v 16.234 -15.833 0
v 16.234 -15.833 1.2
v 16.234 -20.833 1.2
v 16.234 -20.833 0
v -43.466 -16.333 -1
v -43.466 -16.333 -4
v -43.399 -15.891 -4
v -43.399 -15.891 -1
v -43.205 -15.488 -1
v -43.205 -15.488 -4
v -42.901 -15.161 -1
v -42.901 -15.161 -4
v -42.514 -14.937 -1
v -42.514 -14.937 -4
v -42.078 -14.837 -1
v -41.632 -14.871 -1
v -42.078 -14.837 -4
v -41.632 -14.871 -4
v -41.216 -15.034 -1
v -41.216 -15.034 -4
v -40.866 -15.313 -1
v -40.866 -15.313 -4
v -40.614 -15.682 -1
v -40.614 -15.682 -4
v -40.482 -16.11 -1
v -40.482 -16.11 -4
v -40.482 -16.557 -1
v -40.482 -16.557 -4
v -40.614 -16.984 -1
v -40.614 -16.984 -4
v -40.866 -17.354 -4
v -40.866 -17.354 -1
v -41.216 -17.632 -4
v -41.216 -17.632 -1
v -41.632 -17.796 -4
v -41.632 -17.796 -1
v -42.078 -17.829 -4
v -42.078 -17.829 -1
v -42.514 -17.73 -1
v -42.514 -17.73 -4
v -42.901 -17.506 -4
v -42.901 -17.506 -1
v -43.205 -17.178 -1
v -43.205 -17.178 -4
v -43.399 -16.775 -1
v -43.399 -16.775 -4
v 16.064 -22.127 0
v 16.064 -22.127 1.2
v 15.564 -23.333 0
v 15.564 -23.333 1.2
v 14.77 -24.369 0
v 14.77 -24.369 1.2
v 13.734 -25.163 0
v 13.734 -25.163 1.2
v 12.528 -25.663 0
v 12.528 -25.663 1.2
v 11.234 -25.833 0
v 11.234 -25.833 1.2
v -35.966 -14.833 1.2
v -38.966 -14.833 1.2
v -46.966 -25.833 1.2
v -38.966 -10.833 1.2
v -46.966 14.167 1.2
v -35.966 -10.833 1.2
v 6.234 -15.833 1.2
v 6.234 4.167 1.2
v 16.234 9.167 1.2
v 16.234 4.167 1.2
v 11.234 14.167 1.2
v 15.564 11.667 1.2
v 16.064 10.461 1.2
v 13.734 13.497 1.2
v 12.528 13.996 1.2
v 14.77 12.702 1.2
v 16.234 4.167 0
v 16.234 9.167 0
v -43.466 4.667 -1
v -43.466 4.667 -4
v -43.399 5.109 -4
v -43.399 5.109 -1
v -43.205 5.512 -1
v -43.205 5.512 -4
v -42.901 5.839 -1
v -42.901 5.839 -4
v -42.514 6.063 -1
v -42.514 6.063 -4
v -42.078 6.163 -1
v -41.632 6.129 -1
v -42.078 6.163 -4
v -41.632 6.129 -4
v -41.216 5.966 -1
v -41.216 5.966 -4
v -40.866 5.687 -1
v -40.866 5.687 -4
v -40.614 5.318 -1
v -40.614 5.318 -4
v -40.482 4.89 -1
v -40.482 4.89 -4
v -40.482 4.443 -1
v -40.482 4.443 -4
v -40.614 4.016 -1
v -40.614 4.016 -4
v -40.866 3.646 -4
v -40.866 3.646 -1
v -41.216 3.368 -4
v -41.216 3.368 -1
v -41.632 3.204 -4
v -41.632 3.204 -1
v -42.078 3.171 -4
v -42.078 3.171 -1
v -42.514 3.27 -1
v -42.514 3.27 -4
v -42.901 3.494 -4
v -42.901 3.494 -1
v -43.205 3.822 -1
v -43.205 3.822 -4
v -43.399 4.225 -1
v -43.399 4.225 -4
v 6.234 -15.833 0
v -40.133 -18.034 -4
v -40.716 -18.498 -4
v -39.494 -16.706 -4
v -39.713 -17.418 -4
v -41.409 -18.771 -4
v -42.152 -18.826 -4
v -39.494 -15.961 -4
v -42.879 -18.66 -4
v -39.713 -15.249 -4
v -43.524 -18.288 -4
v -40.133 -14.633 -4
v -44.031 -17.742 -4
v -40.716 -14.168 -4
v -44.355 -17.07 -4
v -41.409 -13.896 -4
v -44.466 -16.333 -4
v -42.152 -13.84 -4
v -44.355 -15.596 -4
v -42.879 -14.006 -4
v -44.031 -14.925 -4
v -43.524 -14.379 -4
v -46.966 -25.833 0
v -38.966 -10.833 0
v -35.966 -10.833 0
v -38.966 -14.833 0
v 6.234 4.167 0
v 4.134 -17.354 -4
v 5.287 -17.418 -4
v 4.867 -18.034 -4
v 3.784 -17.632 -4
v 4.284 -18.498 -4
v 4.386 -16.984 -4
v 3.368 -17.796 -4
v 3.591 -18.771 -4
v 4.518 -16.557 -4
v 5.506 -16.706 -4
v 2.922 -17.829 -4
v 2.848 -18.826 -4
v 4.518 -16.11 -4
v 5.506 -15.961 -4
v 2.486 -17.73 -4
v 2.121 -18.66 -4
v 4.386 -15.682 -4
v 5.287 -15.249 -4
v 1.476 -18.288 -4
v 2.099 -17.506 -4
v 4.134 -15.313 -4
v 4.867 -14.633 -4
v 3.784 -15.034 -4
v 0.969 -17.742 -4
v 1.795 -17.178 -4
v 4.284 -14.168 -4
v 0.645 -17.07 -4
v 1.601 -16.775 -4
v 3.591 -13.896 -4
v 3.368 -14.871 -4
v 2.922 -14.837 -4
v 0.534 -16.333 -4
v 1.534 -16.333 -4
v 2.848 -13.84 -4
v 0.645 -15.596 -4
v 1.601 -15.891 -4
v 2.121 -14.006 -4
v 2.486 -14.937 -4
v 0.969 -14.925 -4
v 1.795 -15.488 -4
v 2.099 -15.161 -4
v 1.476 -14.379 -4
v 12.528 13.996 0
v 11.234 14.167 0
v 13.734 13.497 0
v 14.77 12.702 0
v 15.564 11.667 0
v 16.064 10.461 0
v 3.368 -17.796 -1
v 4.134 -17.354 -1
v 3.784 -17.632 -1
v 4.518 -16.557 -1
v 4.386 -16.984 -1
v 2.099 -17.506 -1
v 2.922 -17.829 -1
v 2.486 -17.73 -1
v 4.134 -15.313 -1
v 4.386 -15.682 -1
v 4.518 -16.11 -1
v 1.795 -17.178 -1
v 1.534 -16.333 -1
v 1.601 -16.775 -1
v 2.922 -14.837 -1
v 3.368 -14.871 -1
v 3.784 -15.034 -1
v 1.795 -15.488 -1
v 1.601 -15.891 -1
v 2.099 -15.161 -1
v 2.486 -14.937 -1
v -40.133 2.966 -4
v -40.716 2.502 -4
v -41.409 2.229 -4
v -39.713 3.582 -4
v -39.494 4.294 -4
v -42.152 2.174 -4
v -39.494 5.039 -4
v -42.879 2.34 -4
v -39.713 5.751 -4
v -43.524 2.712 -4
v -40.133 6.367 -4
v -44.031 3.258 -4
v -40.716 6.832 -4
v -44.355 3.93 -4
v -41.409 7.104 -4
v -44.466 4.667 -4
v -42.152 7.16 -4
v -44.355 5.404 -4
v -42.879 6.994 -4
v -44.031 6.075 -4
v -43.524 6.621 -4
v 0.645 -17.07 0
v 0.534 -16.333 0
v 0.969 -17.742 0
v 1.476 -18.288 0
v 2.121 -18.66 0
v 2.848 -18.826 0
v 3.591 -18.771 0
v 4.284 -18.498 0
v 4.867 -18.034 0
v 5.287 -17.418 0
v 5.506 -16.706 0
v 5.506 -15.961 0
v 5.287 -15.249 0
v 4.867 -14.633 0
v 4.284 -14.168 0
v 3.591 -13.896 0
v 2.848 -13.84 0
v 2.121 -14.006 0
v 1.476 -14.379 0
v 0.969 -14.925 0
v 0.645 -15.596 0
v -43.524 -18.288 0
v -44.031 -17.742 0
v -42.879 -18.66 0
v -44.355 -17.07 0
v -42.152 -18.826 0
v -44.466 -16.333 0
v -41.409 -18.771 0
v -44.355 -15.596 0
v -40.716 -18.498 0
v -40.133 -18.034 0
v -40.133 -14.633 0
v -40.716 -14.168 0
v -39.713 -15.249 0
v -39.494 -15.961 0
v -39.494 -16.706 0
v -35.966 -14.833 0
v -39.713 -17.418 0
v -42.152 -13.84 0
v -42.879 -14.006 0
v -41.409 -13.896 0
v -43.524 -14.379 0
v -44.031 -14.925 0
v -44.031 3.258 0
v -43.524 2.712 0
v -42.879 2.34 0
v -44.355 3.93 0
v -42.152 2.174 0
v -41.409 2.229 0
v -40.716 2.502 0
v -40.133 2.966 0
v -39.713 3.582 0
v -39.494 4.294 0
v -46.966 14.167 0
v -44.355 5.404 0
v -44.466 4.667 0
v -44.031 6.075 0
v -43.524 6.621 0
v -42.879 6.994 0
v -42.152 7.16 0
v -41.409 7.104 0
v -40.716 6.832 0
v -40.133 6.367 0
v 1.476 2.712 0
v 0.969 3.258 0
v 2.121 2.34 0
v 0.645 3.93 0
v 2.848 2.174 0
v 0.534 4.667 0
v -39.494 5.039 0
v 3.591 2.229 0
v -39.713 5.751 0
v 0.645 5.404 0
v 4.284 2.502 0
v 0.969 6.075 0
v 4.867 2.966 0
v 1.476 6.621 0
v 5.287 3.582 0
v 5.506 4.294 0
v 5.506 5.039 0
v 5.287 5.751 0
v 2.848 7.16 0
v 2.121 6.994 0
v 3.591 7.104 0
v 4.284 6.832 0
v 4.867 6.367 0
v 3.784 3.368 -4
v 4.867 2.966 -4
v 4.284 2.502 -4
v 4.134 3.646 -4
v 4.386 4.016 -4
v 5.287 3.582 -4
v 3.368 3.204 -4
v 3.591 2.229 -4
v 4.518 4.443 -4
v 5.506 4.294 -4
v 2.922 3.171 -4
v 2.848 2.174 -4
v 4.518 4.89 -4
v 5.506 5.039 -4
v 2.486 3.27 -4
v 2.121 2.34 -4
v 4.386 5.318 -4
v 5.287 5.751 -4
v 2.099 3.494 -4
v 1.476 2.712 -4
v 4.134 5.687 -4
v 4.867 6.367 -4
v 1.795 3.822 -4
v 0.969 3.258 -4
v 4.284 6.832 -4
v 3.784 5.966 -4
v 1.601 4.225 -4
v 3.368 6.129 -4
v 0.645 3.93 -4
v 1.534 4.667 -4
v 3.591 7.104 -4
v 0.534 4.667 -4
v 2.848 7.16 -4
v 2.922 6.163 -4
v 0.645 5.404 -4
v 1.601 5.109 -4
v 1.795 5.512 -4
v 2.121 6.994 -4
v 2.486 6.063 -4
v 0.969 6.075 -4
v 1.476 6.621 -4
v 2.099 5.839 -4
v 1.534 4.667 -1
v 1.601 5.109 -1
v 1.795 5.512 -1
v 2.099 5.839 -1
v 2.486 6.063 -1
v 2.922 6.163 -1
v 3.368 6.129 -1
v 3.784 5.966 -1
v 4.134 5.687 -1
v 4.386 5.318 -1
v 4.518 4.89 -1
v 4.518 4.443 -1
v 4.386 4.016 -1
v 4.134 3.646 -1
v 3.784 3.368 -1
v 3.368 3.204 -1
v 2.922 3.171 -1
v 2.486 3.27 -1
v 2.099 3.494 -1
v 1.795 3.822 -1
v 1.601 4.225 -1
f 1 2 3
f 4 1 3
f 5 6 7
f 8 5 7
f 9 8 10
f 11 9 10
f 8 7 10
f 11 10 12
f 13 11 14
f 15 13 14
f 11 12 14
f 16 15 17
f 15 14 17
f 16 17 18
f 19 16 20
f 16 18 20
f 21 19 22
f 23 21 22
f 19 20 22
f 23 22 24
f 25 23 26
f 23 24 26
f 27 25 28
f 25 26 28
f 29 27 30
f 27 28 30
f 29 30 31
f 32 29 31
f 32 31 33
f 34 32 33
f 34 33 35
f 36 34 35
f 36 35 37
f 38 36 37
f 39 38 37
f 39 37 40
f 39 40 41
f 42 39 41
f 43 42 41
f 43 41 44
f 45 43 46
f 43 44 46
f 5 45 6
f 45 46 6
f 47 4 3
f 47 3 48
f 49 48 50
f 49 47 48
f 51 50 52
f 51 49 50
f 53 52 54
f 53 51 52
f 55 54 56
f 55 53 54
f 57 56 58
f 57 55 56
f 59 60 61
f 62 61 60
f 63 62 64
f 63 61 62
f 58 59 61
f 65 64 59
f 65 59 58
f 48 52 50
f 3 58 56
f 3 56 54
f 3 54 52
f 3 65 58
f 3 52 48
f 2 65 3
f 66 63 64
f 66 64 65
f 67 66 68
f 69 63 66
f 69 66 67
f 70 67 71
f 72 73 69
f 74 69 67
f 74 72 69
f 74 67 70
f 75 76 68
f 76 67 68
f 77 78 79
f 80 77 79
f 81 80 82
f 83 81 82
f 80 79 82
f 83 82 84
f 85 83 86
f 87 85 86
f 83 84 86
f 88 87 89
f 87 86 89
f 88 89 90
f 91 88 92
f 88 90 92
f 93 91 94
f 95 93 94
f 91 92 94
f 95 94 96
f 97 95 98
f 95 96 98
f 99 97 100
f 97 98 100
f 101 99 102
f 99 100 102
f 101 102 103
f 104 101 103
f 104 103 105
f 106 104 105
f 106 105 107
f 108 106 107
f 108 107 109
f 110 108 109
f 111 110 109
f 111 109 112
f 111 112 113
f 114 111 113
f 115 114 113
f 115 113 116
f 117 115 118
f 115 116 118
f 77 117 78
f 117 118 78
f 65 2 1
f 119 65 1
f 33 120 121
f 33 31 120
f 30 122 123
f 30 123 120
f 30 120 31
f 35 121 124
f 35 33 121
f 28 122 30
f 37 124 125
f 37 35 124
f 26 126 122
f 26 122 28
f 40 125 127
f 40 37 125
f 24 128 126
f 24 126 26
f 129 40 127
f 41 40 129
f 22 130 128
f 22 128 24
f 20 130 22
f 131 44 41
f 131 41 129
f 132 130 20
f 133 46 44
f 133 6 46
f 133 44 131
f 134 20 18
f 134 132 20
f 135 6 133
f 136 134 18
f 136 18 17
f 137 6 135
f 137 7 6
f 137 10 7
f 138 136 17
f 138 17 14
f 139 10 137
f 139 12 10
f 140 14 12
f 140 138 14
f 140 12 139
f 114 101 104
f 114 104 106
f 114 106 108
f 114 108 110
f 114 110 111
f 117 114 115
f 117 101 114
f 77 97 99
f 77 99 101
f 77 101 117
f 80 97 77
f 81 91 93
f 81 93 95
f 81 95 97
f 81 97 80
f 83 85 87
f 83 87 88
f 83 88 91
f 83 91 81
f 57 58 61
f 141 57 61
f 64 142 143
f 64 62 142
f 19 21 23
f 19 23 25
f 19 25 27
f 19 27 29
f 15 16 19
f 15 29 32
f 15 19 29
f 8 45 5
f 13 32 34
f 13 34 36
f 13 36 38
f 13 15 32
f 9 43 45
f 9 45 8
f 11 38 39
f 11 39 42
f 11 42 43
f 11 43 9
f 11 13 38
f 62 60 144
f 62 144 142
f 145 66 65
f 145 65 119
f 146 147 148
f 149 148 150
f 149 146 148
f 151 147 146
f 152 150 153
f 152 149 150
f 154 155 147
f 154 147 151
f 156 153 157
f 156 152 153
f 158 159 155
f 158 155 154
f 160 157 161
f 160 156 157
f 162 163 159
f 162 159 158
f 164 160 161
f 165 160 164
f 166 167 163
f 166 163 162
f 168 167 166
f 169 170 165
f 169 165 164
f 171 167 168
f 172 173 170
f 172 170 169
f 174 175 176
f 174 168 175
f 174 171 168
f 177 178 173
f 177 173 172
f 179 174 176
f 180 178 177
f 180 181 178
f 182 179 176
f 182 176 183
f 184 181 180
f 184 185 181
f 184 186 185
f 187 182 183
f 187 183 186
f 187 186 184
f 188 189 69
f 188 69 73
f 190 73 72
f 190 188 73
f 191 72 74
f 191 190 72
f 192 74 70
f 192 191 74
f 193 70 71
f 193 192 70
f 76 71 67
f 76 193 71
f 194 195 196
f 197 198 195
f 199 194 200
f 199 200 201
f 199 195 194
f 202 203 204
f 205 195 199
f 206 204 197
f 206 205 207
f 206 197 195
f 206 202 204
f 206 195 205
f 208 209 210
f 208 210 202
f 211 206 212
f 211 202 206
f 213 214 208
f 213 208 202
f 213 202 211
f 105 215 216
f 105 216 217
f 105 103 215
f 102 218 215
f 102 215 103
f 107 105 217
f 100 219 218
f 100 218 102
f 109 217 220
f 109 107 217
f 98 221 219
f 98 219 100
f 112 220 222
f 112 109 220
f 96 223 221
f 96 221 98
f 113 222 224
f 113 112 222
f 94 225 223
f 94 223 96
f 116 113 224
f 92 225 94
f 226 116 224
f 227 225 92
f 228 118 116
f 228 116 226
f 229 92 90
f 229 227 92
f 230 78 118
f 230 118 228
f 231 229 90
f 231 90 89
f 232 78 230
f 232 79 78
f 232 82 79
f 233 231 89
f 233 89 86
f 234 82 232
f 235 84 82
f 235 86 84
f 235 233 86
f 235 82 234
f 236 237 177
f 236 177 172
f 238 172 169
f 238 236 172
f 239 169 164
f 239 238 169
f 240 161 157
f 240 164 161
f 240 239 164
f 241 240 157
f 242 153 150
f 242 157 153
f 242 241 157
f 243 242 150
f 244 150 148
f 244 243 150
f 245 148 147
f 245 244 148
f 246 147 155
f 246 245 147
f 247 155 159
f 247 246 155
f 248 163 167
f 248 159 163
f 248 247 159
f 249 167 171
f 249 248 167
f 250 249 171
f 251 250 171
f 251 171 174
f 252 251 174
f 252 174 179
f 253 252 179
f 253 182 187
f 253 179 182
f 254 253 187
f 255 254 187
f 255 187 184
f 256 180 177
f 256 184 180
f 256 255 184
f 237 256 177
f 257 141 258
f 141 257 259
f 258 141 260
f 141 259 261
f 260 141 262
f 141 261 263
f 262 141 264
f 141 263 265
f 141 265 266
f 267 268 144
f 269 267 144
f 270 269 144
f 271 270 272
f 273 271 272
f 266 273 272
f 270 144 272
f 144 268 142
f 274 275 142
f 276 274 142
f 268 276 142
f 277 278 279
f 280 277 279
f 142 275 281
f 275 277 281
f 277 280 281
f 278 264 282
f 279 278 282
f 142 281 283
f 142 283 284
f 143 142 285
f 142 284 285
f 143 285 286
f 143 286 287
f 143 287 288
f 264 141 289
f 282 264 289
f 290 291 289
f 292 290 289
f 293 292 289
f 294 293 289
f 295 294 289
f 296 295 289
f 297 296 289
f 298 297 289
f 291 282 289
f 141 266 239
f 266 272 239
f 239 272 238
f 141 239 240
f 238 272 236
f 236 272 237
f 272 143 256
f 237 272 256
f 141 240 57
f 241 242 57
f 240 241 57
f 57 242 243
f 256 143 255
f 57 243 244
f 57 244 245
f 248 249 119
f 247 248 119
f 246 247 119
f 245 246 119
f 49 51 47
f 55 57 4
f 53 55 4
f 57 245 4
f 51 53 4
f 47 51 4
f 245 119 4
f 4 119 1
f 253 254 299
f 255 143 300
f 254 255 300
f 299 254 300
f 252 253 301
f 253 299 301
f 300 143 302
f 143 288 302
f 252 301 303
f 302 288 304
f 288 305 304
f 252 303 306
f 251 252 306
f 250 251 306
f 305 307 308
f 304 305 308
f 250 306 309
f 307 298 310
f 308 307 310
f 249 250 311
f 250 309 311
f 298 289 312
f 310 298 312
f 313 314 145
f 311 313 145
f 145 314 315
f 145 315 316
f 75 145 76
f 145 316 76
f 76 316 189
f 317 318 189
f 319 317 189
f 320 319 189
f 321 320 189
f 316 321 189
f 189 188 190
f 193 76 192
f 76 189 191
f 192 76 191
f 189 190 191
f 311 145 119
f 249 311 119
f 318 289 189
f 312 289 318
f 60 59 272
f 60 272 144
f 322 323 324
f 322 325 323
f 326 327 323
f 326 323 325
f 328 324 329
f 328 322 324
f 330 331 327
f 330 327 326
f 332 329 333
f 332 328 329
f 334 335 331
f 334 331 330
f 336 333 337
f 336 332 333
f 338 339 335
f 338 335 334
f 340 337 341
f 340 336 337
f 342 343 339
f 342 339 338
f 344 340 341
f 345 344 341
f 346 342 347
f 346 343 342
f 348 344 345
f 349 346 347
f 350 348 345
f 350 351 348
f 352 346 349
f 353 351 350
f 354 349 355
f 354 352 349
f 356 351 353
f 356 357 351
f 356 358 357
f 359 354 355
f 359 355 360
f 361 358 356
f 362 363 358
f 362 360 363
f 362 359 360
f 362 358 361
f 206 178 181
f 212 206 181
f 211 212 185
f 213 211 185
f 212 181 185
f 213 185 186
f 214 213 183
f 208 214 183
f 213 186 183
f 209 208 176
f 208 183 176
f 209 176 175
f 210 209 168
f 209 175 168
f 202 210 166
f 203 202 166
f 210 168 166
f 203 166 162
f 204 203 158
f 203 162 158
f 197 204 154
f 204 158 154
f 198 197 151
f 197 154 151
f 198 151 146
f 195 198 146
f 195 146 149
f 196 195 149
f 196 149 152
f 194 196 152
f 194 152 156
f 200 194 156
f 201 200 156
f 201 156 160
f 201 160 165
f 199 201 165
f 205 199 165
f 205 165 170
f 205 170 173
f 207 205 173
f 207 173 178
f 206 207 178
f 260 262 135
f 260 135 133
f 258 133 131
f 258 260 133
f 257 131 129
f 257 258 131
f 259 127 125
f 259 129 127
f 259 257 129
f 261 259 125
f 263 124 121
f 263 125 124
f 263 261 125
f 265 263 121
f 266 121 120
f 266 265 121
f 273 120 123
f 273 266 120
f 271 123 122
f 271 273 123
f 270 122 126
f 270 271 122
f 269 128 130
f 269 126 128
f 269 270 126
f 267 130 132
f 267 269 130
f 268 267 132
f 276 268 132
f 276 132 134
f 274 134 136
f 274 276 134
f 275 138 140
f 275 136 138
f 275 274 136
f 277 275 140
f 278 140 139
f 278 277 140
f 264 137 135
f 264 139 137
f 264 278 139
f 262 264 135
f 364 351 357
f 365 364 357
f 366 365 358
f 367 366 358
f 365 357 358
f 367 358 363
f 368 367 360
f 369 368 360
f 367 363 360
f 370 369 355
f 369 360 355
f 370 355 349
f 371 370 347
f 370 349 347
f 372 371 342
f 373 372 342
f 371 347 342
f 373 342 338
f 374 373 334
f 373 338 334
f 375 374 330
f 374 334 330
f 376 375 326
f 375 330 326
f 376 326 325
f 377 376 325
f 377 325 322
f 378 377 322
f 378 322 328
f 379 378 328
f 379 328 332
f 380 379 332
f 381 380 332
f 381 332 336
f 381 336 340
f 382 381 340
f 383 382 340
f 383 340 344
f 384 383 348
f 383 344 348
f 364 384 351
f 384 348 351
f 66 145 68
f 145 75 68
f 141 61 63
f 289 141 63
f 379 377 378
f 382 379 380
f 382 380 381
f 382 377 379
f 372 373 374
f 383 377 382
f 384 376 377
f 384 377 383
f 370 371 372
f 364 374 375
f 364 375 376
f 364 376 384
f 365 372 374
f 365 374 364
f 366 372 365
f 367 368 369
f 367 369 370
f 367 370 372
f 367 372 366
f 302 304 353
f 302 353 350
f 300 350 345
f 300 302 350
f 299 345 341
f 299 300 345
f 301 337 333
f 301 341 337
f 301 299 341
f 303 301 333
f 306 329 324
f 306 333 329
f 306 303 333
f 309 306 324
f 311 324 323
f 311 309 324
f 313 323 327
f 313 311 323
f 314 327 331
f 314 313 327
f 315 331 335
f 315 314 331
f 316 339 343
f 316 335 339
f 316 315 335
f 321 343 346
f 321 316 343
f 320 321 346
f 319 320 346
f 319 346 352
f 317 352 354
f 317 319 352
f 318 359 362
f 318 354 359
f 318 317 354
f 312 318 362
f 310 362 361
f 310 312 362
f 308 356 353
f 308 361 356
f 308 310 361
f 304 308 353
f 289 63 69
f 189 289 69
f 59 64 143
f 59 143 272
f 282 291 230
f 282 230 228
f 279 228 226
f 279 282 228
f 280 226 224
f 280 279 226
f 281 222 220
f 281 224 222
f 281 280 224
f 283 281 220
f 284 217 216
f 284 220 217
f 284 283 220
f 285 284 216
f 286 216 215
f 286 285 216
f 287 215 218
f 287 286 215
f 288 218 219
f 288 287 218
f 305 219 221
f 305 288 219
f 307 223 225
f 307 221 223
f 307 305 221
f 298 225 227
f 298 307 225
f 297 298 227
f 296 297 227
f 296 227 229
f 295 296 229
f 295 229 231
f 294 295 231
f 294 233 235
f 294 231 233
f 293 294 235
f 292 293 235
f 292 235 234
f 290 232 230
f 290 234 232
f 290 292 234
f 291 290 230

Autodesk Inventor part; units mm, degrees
ref_plane "YZ Plane" through (0, 0, 0) normal (1, 0, 0) x (0, 1, 0)
ref_plane "XZ Plane" through (0, 0, 0) normal (0, 1, 0) x (-1, 0, 0)
ref_plane "XY Plane" through (0, 0, 0) normal (0, 0, 1) x (1, 0, 0)
sketch "Sketch1" plane through (0, 0, 0) normal (0, 0, 1) x (1, 0, 0)
  line L0 (-66.7657, 11.6667) -> (16.2343, 11.6667)
  line L1 (16.2343, 11.6667) -> (16.2343, -23.3333)
  line L2 (16.2343, -23.3333) -> (-66.7657, -23.3333)
  line L3 (-66.7657, -23.3333) -> (-66.7657, 11.6667)
  point P0 (0, 0)
  dimension "d0" = 35
  dimension "d1" = 83
extrude "Extrusion1" add sketch "Sketch1" along normal blind 1.2
sketch "Sketch2" plane through (0, 0, 1.2) normal (0, 0, 1) x (1, 0, 0)
  line L0 (16.2343, -23.3333) -> (16.2343, 11.6667) projected
  line L1 (-66.7657, 11.6667) -> (16.2343, 11.6667)
  line L2 (16.2343, 11.6667) -> (16.2343, 9.8667)
  line L3 (16.2343, 9.8667) -> (-66.7657, 9.8667)
  line L4 (-66.7657, 9.8667) -> (-66.7657, 11.6667)
  line L5 (-66.7657, 11.6667) -> (-66.7657, -23.3333) projected
  line L6 (16.2343, -23.3333) -> (-66.7657, -23.3333)
  line L7 (-66.7657, -23.3333) -> (-66.7657, -21.5333)
  line L8 (-66.7657, -21.5333) -> (16.2343, -21.5333)
  line L9 (16.2343, -21.5333) -> (16.2343, -23.3333)
  line L10 (-66.7657, 9.8667) -> (-65.5657, 9.8667)
  line L11 (-65.5657, 9.8667) -> (-65.5657, -21.5333)
  line L12 (-65.5657, -21.5333) -> (-66.7657, -21.5333)
  line L13 (-66.7657, -21.5333) -> (-66.7657, 9.8667)
  line L14 (16.2343, 9.8667) -> (15.0343, 9.8667)
  line L15 (15.0343, 9.8667) -> (15.0343, -21.5333)
  line L16 (15.0343, -21.5333) -> (16.2343, -21.5333)
  line L17 (16.2343, -21.5333) -> (16.2343, 9.8667)
  line L18 (-66.7657, 11.6667) -> (-65.5657, 11.6667)
  line L19 (-65.5657, 11.6667) -> (-65.5657, -21.5333)
  line L20 (-65.5657, -21.5333) -> (-66.7657, -21.5333)
  line L21 (-66.7657, -21.5333) -> (-66.7657, 11.6667)
  line L22 (-66.7657, 11.6667) -> (16.2343, 11.6667)
  line L23 (16.2343, 11.6667) -> (16.2343, 9.8667)
  line L24 (16.2343, 9.8667) -> (-66.7657, 9.8667)
  line L25 (-66.7657, 9.8667) -> (-66.7657, 11.6667)
  point P0 (0, 0)
  dimension "d4" = 1.8
  dimension "d5" = 1.8
  dimension "d6" = 1.2
  dimension "d7" = 1.2
extrude "Extrusion2" add sketch "Sketch2" along normal blind 30 contours L6 L5 L8 L0 | L8 L15 L3 L0 | L3 L19 L1 L0 | L5 L3 L11 L8 | L4 L1 L19 L3
sketch "Sketch3" plane through (0, 0, 31.2) normal (0, 0, 1) x (1, 0, 0)
  point P0 (0, 0)
sketch "Sketch4" plane through (16.2343, -23.3333, 0) normal (1, 0, 0) x (0, 0, -1)
  line L0 (-1.2, 33.2) -> (-1.2, 1.8) projected
  line L1 (-1.2, 7.5) -> (-6.2, 7.5)
  line L2 (-6.2, 7.5) -> (-6.2, 27.5)
  line L3 (-6.2, 27.5) -> (-1.2, 27.5)
  line L4 (-1.2, 27.5) -> (-1.2, 7.5)
  line L5 (-1.2, 1.8) -> (-31.2, 1.8) projected
  line L6 (-1.2, 33.2) -> (-31.2, 33.2) projected
  line L7 (-6.2, 7.5) -> (0, 7.5)
  line L8 (0, 7.5) -> (0, 27.5)
  line L9 (0, 27.5) -> (-6.2, 27.5)
  line L10 (-6.2, 27.5) -> (-6.2, 7.5)
  line L11 (0, 35) -> (0, 0) projected
  point P0 (0, 23.3333)
  dimension "d10" = 20
  dimension "d11" = 5
  dimension "d12" = 5.7
  dimension "d13" = 5.7
extrude "Extrusion3" cut sketch "Sketch4" against normal blind 10
fillet "Fillet1" radius 2 8 edges at (-66.7657, 11.6667, 15.6) (-65.5657, 9.8667, 16.2) (-66.7657, -23.3333, 15.6) (-65.5657, -21.5333, 16.2) (15.0343, 9.8667, 16.2) (16.2343, 11.6667, 15.6) (16.2343, -23.3333, 15.6) (15.0343, -21.5333, 16.2)
sketch "Sketch5" plane through (0, 0, 1.2) normal (0, 0, 1) x (1, 0, 0)
  circle A0 centre (10.0343, 6.6667) radius 1.5
  circle A1 centre (10.0343, -18.3333) radius 1.5
  line L0 (15.0343, 7.8667) -> (15.0343, -19.5333) projected
  line L1 (13.0343, -21.5333) -> (-63.5657, -21.5333) projected
  line L2 (-63.5657, 9.8667) -> (13.0343, 9.8667) projected
  point P0 (0, 0)
  dimension "d17" = 3
  dimension "d18" = 3
  dimension "d19" = 25
  dimension "d20" = 5
  dimension "d21" = 5
  dimension "d22" = 3.2
  dimension "d23" = 3.2
extrude "Extrusion4" add sketch "Sketch5" along normal blind 5
sketch "Sketch6" plane through (0, 0, 1.2) normal (0, 0, 1) x (1, 0, 0)
  circle A0 centre (-41.9656, -18.3962) radius 1.5
  circle A1 centre (-41.9656, 6.6038) radius 1.5
  circle A2 centre (10.0343, 6.6667) radius 1.5 projected
  circle A3 centre (10.0343, -18.3333) radius 1.5 projected
  point P0 (0, 0)
  dimension "d26" = 3
  dimension "d27" = 3
  dimension "d28" = 25
  dimension "d29" = 52
  dimension "d30" = 52
extrude "Extrusion5" add sketch "Sketch6" along normal blind 5 contours A0 | A1
sketch "Sketch7" plane through (-41.9656, 6.6038, 6.2) normal (0, 0, 1) x (1, 0, 0)
  point P0 (41.9656, -6.6038)
sketch "Sketch8" plane through (0, 0, 1.2) normal (0, 0, 1) x (1, 0, 0)
  circle A0 centre (-41.9656, -18.3962) radius 1.5 projected
  circle A1 centre (-41.9656, -18.3962) radius 3
  circle A2 centre (-41.9656, 6.6038) radius 1.5 projected
  circle A3 centre (-41.9656, 6.6038) radius 3
  circle A4 centre (10.0343, -18.3333) radius 1.5 projected
  circle A5 centre (10.0343, -18.3333) radius 3
  circle A6 centre (10.0343, 6.6667) radius 1.5 projected
  circle A7 centre (10.0343, 6.6667) radius 3
  point P0 (0, 0)
  dimension "d33" = 6
  dimension "d34" = 6
  dimension "d35" = 6
  dimension "d36" = 6
extrude "Extrusion6" add sketch "Sketch8" along normal blind 5
sketch "Sketch9" plane through (0, 0, 1.2) normal (0, 0, 1) x (1, 0, 0)
  arc A0 (8.376, -15.8333) -> (11.6926, -15.8333) centre (10.0343, -18.3333) ccw projected
  circle A1 centre (10.0343, -18.3333) radius 3
  arc A2 (11.6926, 4.1667) -> (8.376, 4.1667) centre (10.0343, 6.6667) ccw projected
  circle A3 centre (10.0343, 6.6667) radius 3
  point P0 (0, 0)
  dimension "d39" = 6
  dimension "d40" = 6
extrude "Extrusion7" add sketch "Sketch9" against normal blind 1.2
sketch "Sketch10" plane through (-41.9656, -18.3962, 6.2) normal (0, 0, 1) x (1, 0, 0)
  circle A0 centre (0, 0) radius 3 projected
  circle A1 centre (0, 0) radius 1.5
  circle A2 centre (0, 25) radius 3 projected
  circle A3 centre (0, 25) radius 1.5
  circle A4 centre (52, 0.0629) radius 3 projected
  circle A5 centre (52, 0.0629) radius 1.5
  circle A6 centre (52, 25.0629) radius 3 projected
  circle A7 centre (52, 25.0629) radius 1.5
  point P0 (41.9656, 18.3962)
  dimension "d43" = 3
  dimension "d44" = 3
  dimension "d45" = 3
  dimension "d46" = 3
extrude "Extrusion8" cut sketch "Sketch10" against normal blind 4 contours A1 | A3 | A5 | A7
thread "Thread1" size "M3x0.5" class "6H" standard "ANSI Metric M Profile" full length
thread "Thread2" size "M3x0.5" class "6H" standard "ANSI Metric M Profile" full length
thread "Thread3" size "M3x0.5" class "6H" standard "ANSI Metric M Profile" full length
thread "Thread4" size "M3x0.5" class "6H" standard "ANSI Metric M Profile" full length
sketch "Sketch11" plane through (0, 0, 31.2) normal (0, 0, 1) x (1, 0, 0)
  arc A0 (-64.7657, 11.6667) -> (-66.7657, 9.6667) centre (-64.7657, 9.6667) ccw projected
  line L0 (-66.7657, 9.6667) -> (16.2343, 9.6667)
  line L1 (16.2343, 9.6667) -> (16.2343, 14.6667)
  line L2 (16.2343, 14.6667) -> (-66.7657, 14.6667)
  line L3 (-66.7657, 14.6667) -> (-66.7657, 9.6667)
  line L4 (16.2343, -21.3333) -> (-66.7657, -21.3333)
  line L5 (-66.7657, -21.3333) -> (-66.7657, -26.3333)
  line L6 (-66.7657, -26.3333) -> (16.2343, -26.3333)
  line L7 (16.2343, -26.3333) -> (16.2343, -21.3333)
  point P0 (0, 0)
  dimension "d57" = 5
  dimension "d58" = 5
  dimension "d59" = 83
extrude "Extrusion9" add sketch "Sketch11" against normal blind 31.2
fillet "Fillet2" radius 2 4 edges at (16.2343, -26.3333, 15.6) (16.2343, 14.6667, 15.6) (-66.7657, 14.6667, 15.6) (-66.7657, -26.3333, 15.6)
sketch "Sketch12" plane through (0, 0, 31.2) normal (0, 0, 1) x (1, 0, 0)
  line L0 (14.2343, -26.3333) -> (-64.7657, -26.3333) projected
  line L1 (8.2343, -26.3333) -> (-58.7657, -26.3333)
  line L2 (-58.7657, -26.3333) -> (-58.7657, -23.1333)
  line L3 (-58.7657, -23.1333) -> (8.2343, -23.1333)
  line L4 (8.2343, -23.1333) -> (8.2343, -26.3333)
  line L5 (-64.7657, 14.6667) -> (14.2343, 14.6667) projected
  line L6 (8.2343, 14.6667) -> (-58.7657, 14.6667)
  line L7 (-58.7657, 14.6667) -> (-58.7657, 11.4667)
  line L8 (-58.7657, 11.4667) -> (8.2343, 11.4667)
  line L9 (8.2343, 11.4667) -> (8.2343, 14.6667)
  line L10 (16.2343, -24.3333) -> (16.2343, 12.6667) projected
  line L11 (-66.7657, 12.6667) -> (-66.7657, -24.3333) projected
  line L12 (13.9061, -21.3333) -> (-64.4375, -21.3333) projected
  line L13 (10.0343, 9.6667) -> (-64.4375, 9.6667) projected
  point P0 (0, 0)
  dimension "d63" = 8
  dimension "d64" = 8
  dimension "d65" = 1.8
  dimension "d66" = 1.8
extrude "Extrusion10" cut sketch "Sketch12" against normal blind 31.2
fillet "Fillet3" radius 2 4 edges at (8.2343, -26.3333, 15.6) (-58.7657, -26.3333, 15.6) (8.2343, 14.6667, 15.6) (-58.7657, 14.6667, 15.6)
sketch "Sketch13" plane through (0, 0, 31.2) normal (0, 0, 1) x (1, 0, 0)
  line L0 (14.2343, -26.3333) -> (10.2343, -26.3333) projected
  circle A0 centre (12.2343, -23.9333) radius 1.5
  circle A1 centre (-62.7657, -23.9333) radius 1.5
  line L1 (-64.7657, -26.3333) -> (-60.7657, -26.3333) projected
  circle A2 centre (12.2343, 12.2667) radius 1.5
  circle A3 centre (-62.7657, 12.2667) radius 1.5
  line L2 (-66.7657, 12.6667) -> (-66.7657, -24.3333) projected
  line L3 (-60.7657, 14.6667) -> (-64.7657, 14.6667) projected
  line L4 (16.2343, -24.3333) -> (16.2343, 12.6667) projected
  line L5 (14.2343, 14.6667) -> (10.2343, 14.6667) projected
  line L6 (8.2343, -23.1333) -> (8.2343, -24.3333) projected
  point P0 (0, 0)
  dimension "d70" = 2.4
  dimension "d71" = 3
  dimension "d72" = 3
  dimension "d73" = 2.4
  dimension "d74" = 3
  dimension "d75" = 3
  dimension "d76" = 4
  dimension "d77" = 4
  dimension "d78" = 2.4
  dimension "d79" = 4
  dimension "d80" = 2.4
  dimension "d81" = 4
hole "Hole1" at (12.2343, -23.9333, 31.2) at (12.2343, 12.2667, 31.2) at (-62.7657, -23.9333, 31.2) at (-62.7657, 12.2667, 31.2) direction (0, 0, -1) diameter 3 depth 5 tip angle 118
sketch "Sketch14" plane through (0, 0, 31.2) normal (0, 0, 1) x (1, 0, 0)
  line L0 (-68.9331, 15.611) -> (20.031, 15.611)
  line L1 (20.031, 15.611) -> (20.031, -27.6485)
  line L2 (20.031, -27.6485) -> (-68.9331, -27.6485)
  line L3 (-68.9331, -27.6485) -> (-68.9331, 15.611)
  point P0 (0, 0)
extrude "Extrusion11" cut sketch "Sketch14" against normal blind 25
sketch "Sketch15" plane through (0, 0, 6.2) normal (0, 0, 1) x (1, 0, 0)
  line L0 (-73.259, 21.6297) -> (22.194, 21.6297)
  line L1 (22.194, 21.6297) -> (22.194, 9.6667)
  line L2 (22.194, 9.6667) -> (-73.259, 9.6667)
  line L3 (-73.259, 9.6667) -> (-73.259, 21.6297)
  line L4 (-69.8735, -21.3333) -> (26.0497, -21.3333)
  line L5 (26.0497, -21.3333) -> (26.0497, -30.3757)
  line L6 (26.0497, -30.3757) -> (-69.8735, -30.3757)
  line L7 (-69.8735, -30.3757) -> (-69.8735, -21.3333)
  line L8 (10.0343, 9.6667) -> (-64.4375, 9.6667) projected
  line L9 (-41.3548, -21.3333) -> (10.0343, -21.3333) projected
  point P0 (0, 0)
extrude "Extrusion12" cut sketch "Sketch15" against normal blind 25
sketch "Sketch16" plane through (0, 0, 1.2) normal (0, 0, 1) x (1, 0, 0)
  line L0 (6.2343, 4.1667) -> (16.2343, 4.1667)
  line L1 (16.2343, 4.1667) -> (16.2343, -15.8333)
  line L2 (16.2343, -15.8333) -> (6.2343, -15.8333)
  line L3 (6.2343, -15.8333) -> (6.2343, 4.1667)
  point P0 (0, 0)
extrude "Extrusion13" cut sketch "Sketch16" against normal blind 25
sketch "Sketch17" plane through (0, 0, 1.2) normal (0, 0, 1) x (1, 0, 0)
  line L0 (6.2343, 4.1667) -> (16.2343, 4.1667)
  line L1 (16.2343, 4.1667) -> (16.2343, -15.8333)
  line L2 (16.2343, -15.8333) -> (6.2343, -15.8333)
  line L3 (6.2343, -15.8333) -> (6.2343, 4.1667)
  point P0 (0, 0)
extrude "Extrusion14" cut sketch "Sketch17" along normal blind 25
sketch "Sketch18" plane through (0, 0, 1.2) normal (0, 0, 1) x (1, 0, 0)
  line L0 (15.0343, -19.5333) -> (15.0343, -15.8333) projected
  line L1 (6.2343, 5.1667) -> (15.0343, 5.1667)
  line L2 (15.0343, 5.1667) -> (15.0343, -16.8333)
  line L3 (15.0343, -16.8333) -> (6.2343, -16.8333)
  line L4 (6.2343, -16.8333) -> (6.2343, 5.1667)
  line L5 (6.2343, 4.1667) -> (8.376, 4.1667) projected
  line L6 (15.0343, -15.8333) -> (11.6926, -15.8333) projected
  line L7 (6.2343, -15.8333) -> (6.2343, 4.1667) projected
  point P0 (0, 0)
  dimension "d97" = 1
  dimension "d98" = 1
extrude "Extrusion15" cut sketch "Sketch18" along normal blind 25
sketch "Sketch19" plane through (0, 0, 6.2) normal (0, 0, 1) x (1, 0, 0)
  line L0 (13.9061, 9.6667) -> (16.2343, 9.6667)
  line L1 (16.2343, 9.6667) -> (16.2343, -21.3333)
  line L2 (16.2343, -21.3333) -> (13.9061, -21.3333)
  line L3 (13.9061, -21.3333) -> (13.9061, 9.6667)
  line L4 (-66.7657, 9.6667) -> (-64.4375, 9.6667)
  line L5 (-64.4375, 9.6667) -> (-64.4375, -21.3333)
  line L6 (-64.4375, -21.3333) -> (-66.7657, -21.3333)
  line L7 (-66.7657, -21.3333) -> (-66.7657, 9.6667)
  point P0 (0, 0)
extrude "Extrusion16" cut sketch "Sketch19" against normal blind 5
sketch "Sketch20" plane through (0, 0, 1.2) normal (0, 0, 1) x (1, 0, 0)
  line L0 (-73.7657, 14.1667) -> (16.2343, 14.1667)
  line L1 (16.2343, 14.1667) -> (16.2343, -25.8333)
  line L2 (16.2343, -25.8333) -> (-73.7657, -25.8333)
  line L3 (-73.7657, -25.8333) -> (-73.7657, 14.1667)
  line L4 (16.2343, 9.6667) -> (16.2343, 4.1667) projected
  line L5 (-66.7657, 9.6667) -> (16.2343, 9.6667) projected
  line L6 (-41.3548, -21.3333) -> (10.0343, -21.3333) projected
  line L7 (-66.7657, -21.3333) -> (-66.7657, 9.6667) projected
  line L8 (16.2343, 4.1667) -> (6.2343, 4.1667)
  line L9 (6.2343, 4.1667) -> (6.2343, -15.8333)
  line L10 (6.2343, -15.8333) -> (16.2343, -15.8333)
  line L11 (16.2343, -15.8333) -> (16.2343, 4.1667)
  point P0 (0, 0)
  dimension "d103" = 90
  dimension "d104" = 40
  dimension "d105" = 4.5
  dimension "d106" = 4.5
  dimension "d107" = 7
extrude "Extrusion17" add sketch "Sketch20" against normal blind 1.2 contours L0 L1 L8 L9 L10 L2 L3
fillet "Fillet4" radius 5 4 edges at (-73.7657, 14.1667, 0.6) (-73.7657, -25.8333, 0.6) (16.2343, -25.8333, 0.6) (16.2343, 14.1667, 0.6)
sketch "Sketch21" plane through (0, 0, 1.2) normal (0, 0, 1) x (1, 0, 0)
  line L0 (-65.7657, 6.1667) -> (-46.9656, 6.1667)
  line L1 (-46.9656, 6.1667) -> (-46.9656, -17.8333)
  line L2 (-46.9656, -17.8333) -> (-65.7657, -17.8333)
  line L3 (-65.7657, -17.8333) -> (-65.7657, 6.1667)
  line L4 (-68.7657, 14.1667) -> (11.2343, 14.1667) projected
  line L5 (11.2343, -25.8333) -> (-68.7657, -25.8333) projected
  line L6 (-73.7657, -20.8333) -> (-73.7657, 9.1667) projected
  circle A0 centre (-41.9656, 6.6038) radius 1.5 projected
  point P0 (0, 0)
  dimension "d111" = 8
  dimension "d112" = 8
  dimension "d113" = 8
  dimension "d114" = 5
extrude "Extrusion18" cut sketch "Sketch21" against normal blind 1.2 contours L0 L1 L2 L3
sketch "Sketch22" plane through (0, 0, 1.2) normal (0, 0, 1) x (1, 0, 0)
  line L0 (-38.9656, -10.8333) -> (-35.9656, -10.8333)
  line L1 (-35.9656, -10.8333) -> (-35.9656, -14.8333)
  line L2 (-35.9656, -14.8333) -> (-38.9656, -14.8333)
  line L3 (-38.9656, -14.8333) -> (-38.9656, -10.8333)
  line L4 (-46.9656, -17.8333) -> (-65.7657, -17.8333) projected
  circle A0 centre (-41.9656, -18.3962) radius 1.5 projected
  line L5 (11.2343, -25.8333) -> (-68.7657, -25.8333) projected
  point P0 (0, 0)
  dimension "d117" = 3
  dimension "d119" = 4
  dimension "d120" = 3
  dimension "d121" = 11
extrude "Extrusion19" cut sketch "Sketch22" against normal blind 1.2 contours L0 L1 L2 L3
sketch "Sketch23" plane through (0, 0, 1.2) normal (0, 0, 1) x (1, 0, 0)
  point P0 (0, 0)
sketch "Sketch24" plane through (0, 0, 1.2) normal (0, 0, 1) x (1, 0, 0)
  line L0 (-45.9236, 11.5782) -> (14.0106, 11.5782)
  line L1 (14.0106, 11.5782) -> (14.0106, -22.9618)
  line L2 (14.0106, -22.9618) -> (-45.9236, -22.9618)
  line L3 (-45.9236, -22.9618) -> (-45.9236, 11.5782)
  point P0 (0, 0)
extrude "Extrusion20" cut sketch "Sketch24" along normal blind 10
sketch "Sketch25" plane through (0, 0, 1.2) normal (0, 0, 1) x (1, 0, 0)
  line L0 (-68.7657, 14.1667) -> (11.2343, 14.1667) projected
  line L1 (-46.9656, 14.1667) -> (-73.7657, 14.1667)
  line L2 (-73.7657, 14.1667) -> (-73.7657, -25.8333)
  line L3 (-73.7657, -25.8333) -> (-46.9656, -25.8333)
  line L4 (-46.9656, -25.8333) -> (-46.9656, 14.1667)
  line L5 (-46.9656, 6.1667) -> (-46.9656, -17.8333) projected
  line L6 (-73.7657, -20.8333) -> (-73.7657, 9.1667) projected
  line L7 (11.2343, -25.8333) -> (-68.7657, -25.8333) projected
  point P0 (0, 0)
extrude "Extrusion21" cut sketch "Sketch25" against normal blind 10
sketch "Sketch26" plane through (0, 0, 0) normal (0, 0, -1) x (-1, 0, 0)
  circle A0 centre (-3.0344, -16.3333) radius 2.5
  circle A1 centre (-3.0344, 4.6667) radius 2.5
  circle A2 centre (41.9656, -16.3333) radius 2.5
  circle A3 centre (41.9656, 4.6667) radius 2.5
  line L0 (46.9656, -25.8333) -> (46.9656, 14.1667) projected
  line L1 (-11.2343, -25.8333) -> (46.9656, -25.8333) projected
  line L2 (46.9656, 14.1667) -> (-11.2343, 14.1667) projected
  point P0 (0, 0)
  dimension "d128" = 5
  dimension "d129" = 5
  dimension "d130" = 5
  dimension "d131" = 5
  dimension "d132" = 45
  dimension "d133" = 21
  dimension "d134" = 0
  dimension "d135" = 21
  dimension "d136" = 45
  dimension "d137" = 5
  dimension "d138" = 9.5
  dimension "d139" = 9.5
  dimension "d140" = 9.5
extrude "Extrusion22" add sketch "Sketch26" along normal blind 4
sketch "Sketch27" plane through (-41.9656, -16.3333, -4) normal (0, 0, -1) x (-1, 0, 0)
  circle A0 centre (0, 0) radius 2.5 projected
  circle A1 centre (0, 0) radius 1.5
  circle A2 centre (0, 21) radius 2.5 projected
  circle A3 centre (0, 21) radius 1.5
  circle A4 centre (-45, 0) radius 2.5 projected
  circle A5 centre (-45, 0) radius 1.5
  circle A6 centre (-45, 21) radius 2.5 projected
  circle A7 centre (-45, 21) radius 1.5
  point P0 (-41.9656, 16.3333)
  dimension "d143" = 3
  dimension "d144" = 3
  dimension "d145" = 3
  dimension "d146" = 3
extrude "Extrusion23" cut sketch "Sketch27" against normal blind 3 contours A1 | A3 | A5 | A7
properties part number "Case Relay"
